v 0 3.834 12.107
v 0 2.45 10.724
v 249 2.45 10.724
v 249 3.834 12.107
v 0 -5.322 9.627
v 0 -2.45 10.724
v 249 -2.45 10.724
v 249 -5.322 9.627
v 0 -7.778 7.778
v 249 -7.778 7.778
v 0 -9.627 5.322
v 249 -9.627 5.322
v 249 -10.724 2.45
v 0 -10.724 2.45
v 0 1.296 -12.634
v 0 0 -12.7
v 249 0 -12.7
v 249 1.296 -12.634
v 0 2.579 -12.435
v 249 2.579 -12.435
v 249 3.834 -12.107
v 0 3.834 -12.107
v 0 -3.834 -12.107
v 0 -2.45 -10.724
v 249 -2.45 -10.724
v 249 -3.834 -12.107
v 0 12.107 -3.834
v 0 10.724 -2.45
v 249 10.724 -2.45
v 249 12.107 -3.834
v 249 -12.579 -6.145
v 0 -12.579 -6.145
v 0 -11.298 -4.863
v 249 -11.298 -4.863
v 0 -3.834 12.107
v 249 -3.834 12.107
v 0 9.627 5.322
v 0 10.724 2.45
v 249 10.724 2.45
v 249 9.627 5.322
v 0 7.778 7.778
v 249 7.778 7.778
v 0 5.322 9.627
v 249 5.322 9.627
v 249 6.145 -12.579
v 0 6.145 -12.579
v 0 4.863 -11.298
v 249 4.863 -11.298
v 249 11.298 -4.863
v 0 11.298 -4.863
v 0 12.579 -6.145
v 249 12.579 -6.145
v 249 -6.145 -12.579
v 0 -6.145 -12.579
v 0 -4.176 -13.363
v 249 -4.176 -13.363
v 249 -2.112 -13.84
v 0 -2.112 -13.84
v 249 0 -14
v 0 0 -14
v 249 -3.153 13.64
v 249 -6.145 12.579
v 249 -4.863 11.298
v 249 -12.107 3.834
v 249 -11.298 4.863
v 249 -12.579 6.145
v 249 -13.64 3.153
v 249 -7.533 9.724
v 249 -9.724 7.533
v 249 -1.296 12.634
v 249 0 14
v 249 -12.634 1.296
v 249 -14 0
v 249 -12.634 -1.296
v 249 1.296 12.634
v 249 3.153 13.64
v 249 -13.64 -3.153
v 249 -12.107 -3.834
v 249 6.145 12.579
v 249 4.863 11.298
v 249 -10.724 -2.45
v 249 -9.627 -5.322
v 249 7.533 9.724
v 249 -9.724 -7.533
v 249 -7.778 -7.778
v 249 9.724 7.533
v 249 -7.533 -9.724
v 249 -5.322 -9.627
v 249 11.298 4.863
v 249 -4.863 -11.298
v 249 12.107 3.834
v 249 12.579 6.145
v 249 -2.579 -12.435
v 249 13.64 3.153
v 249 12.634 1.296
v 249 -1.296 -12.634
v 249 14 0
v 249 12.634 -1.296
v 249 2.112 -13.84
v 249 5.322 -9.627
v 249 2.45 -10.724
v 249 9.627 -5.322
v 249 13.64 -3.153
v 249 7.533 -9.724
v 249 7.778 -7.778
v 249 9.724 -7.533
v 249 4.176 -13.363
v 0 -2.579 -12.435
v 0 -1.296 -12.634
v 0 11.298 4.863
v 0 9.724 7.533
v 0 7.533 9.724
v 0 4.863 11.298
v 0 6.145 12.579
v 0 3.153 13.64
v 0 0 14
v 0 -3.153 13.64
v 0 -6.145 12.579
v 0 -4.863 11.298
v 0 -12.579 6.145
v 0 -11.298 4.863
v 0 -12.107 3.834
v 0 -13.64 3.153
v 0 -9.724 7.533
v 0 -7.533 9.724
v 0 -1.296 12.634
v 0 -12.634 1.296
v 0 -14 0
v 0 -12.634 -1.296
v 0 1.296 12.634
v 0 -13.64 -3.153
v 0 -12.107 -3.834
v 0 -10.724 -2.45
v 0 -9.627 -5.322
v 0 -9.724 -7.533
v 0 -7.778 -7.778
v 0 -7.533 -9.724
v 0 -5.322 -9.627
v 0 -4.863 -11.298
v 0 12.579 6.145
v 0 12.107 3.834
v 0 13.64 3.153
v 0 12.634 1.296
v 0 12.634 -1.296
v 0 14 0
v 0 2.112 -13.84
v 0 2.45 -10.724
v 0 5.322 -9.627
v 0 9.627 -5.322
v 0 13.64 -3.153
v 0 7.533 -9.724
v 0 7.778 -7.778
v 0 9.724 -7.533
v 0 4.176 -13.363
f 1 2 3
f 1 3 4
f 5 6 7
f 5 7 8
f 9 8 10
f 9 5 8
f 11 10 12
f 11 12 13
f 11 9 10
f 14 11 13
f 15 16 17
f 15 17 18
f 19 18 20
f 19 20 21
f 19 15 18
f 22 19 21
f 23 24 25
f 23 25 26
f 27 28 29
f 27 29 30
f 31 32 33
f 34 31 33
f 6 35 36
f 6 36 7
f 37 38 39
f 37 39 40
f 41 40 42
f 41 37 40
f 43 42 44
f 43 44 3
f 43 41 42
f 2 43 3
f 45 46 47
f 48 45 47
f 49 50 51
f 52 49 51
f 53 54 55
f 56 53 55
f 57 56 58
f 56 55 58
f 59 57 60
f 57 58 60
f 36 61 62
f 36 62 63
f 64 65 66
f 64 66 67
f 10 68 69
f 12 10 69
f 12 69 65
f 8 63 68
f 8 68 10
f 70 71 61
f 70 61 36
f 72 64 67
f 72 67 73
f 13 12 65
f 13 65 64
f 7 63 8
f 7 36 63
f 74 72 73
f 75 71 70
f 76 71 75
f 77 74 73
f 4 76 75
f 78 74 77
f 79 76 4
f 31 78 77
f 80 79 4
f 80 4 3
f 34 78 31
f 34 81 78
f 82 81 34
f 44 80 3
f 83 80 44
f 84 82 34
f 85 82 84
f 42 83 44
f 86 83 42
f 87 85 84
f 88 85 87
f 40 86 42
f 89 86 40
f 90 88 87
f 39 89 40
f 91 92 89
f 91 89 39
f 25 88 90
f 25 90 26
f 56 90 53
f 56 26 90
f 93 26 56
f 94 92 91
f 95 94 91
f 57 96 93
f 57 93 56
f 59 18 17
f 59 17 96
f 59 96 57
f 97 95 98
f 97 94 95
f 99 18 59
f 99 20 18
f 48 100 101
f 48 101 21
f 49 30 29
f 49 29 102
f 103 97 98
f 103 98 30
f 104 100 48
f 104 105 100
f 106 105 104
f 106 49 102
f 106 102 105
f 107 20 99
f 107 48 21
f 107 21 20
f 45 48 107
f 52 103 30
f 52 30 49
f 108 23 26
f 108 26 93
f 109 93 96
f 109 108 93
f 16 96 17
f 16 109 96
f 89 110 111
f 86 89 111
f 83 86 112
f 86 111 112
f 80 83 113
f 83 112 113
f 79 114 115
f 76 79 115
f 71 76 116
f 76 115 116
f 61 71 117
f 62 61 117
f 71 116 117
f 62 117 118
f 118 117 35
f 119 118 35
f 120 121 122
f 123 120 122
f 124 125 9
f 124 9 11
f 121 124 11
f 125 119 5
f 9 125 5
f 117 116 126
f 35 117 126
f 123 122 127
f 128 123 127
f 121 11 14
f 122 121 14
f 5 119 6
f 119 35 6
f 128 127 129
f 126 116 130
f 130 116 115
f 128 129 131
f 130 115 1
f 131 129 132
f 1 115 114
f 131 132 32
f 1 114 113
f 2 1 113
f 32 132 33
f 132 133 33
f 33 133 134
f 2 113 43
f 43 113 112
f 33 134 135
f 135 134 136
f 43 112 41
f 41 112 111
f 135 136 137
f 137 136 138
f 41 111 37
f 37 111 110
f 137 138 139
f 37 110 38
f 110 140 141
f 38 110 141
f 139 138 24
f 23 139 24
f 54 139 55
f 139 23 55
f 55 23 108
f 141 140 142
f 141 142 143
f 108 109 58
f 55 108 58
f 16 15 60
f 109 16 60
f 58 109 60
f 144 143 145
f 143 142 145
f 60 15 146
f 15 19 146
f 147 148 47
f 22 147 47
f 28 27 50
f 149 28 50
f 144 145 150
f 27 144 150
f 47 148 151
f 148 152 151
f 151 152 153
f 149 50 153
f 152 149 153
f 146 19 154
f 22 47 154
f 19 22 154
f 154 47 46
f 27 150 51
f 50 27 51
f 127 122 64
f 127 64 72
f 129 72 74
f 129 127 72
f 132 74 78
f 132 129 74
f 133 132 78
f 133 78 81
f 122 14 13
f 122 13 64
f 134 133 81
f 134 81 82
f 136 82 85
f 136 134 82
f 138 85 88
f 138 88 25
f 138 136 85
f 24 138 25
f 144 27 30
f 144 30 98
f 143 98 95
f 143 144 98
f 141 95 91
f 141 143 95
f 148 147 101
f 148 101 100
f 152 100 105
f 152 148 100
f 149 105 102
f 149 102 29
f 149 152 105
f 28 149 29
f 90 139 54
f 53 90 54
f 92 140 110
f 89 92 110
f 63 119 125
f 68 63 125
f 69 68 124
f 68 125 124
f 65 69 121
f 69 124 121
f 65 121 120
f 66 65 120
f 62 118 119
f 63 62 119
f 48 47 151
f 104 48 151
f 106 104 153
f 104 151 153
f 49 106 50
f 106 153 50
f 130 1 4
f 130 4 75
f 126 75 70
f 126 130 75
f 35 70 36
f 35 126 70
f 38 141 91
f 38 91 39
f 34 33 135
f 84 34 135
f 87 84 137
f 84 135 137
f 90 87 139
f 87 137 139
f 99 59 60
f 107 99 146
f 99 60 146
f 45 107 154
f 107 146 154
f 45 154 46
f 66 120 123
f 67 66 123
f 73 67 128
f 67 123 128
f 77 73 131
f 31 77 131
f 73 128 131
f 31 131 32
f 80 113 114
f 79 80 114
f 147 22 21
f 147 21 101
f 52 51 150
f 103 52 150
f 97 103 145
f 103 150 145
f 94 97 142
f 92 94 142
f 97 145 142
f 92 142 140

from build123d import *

# Parameters (mm, degrees)
BOSS_EXTRUDE1_DEPTH = 249


with BuildPart() as part:
    # Sketch1 → Boss-Extrude1 (new body)
    with BuildSketch(Plane(origin=(0, 0, 0), x_dir=(0, 0, -1), z_dir=(1, 0, 0))):
        with BuildLine():
            Line((-11.297790668, 4.86311896), (-12.579426967, 6.144755258))
            ThreePointArc((-12.579426967, 6.144755258), (-14, 0), (-12.579426967, -6.144755258))
            Line((-12.579426967, -6.144755258), (-11.297790668, -4.86311896))
            ThreePointArc((-11.297790668, -4.86311896), (-8.697413409, -8.697413409), (-4.86311896, -11.297790668))
            Line((-4.86311896, -11.297790668), (-6.144755258, -12.579426967))
            ThreePointArc((-6.144755258, -12.579426967), (0, -14), (6.144755258, -12.579426967))
            Line((6.144755258, -12.579426967), (4.86311896, -11.297790668))
            ThreePointArc((4.86311896, -11.297790668), (8.697413409, -8.697413409), (11.297790668, -4.86311896))
            Line((11.297790668, -4.86311896), (12.579426967, -6.144755258))
            ThreePointArc((12.579426967, -6.144755258), (13.64023419, -3.153412633), (14, 0))
            ThreePointArc((14, 0), (13.64023419, 3.153412633), (12.579426967, 6.144755258))
            Line((12.579426967, 6.144755258), (11.297790668, 4.86311896))
            ThreePointArc((11.297790668, 4.86311896), (8.697413409, 8.697413409), (4.86311896, 11.297790668))
            Line((4.86311896, 11.297790668), (6.144755258, 12.579426967))
            ThreePointArc((6.144755258, 12.579426967), (0, 14), (-6.144755258, 12.579426967))
            Line((-6.144755258, 12.579426967), (-4.86311896, 11.297790668))
            ThreePointArc((-4.86311896, 11.297790668), (-8.697413409, 8.697413409), (-11.297790668, 4.86311896))
        make_face()
        with BuildLine():
            Line((-10.723588409, 2.450439069), (-12.107380777, 3.834231437))
            ThreePointArc((-12.107380777, 3.834231437), (-12.7, 0), (-12.107380777, -3.834231437))
            Line((-12.107380777, -3.834231437), (-10.723588409, -2.450439069))
            ThreePointArc((-10.723588409, -2.450439069), (-7.778174593, -7.778174593), (-2.450439069, -10.723588409))
            Line((-2.450439069, -10.723588409), (-3.834231437, -12.107380777))
            ThreePointArc((-3.834231437, -12.107380777), (0, -12.7), (3.834231437, -12.107380777))
            Line((3.834231437, -12.107380777), (2.450439069, -10.723588409))
            ThreePointArc((2.450439069, -10.723588409), (7.778174593, -7.778174593), (10.723588409, -2.450439069))
            Line((10.723588409, -2.450439069), (12.107380777, -3.834231437))
            ThreePointArc((12.107380777, -3.834231437), (12.550970797, -1.939879394), (12.7, 0))
            ThreePointArc((12.7, 0), (12.550970797, 1.939879394), (12.107380777, 3.834231437))
            Line((12.107380777, 3.834231437), (10.723588409, 2.450439069))
            ThreePointArc((10.723588409, 2.450439069), (7.778174593, 7.778174593), (2.450439069, 10.723588409))
            Line((2.450439069, 10.723588409), (3.834231437, 12.107380777))
            ThreePointArc((3.834231437, 12.107380777), (0, 12.7), (-3.834231437, 12.107380777))
            Line((-3.834231437, 12.107380777), (-2.450439069, 10.723588409))
            ThreePointArc((-2.450439069, 10.723588409), (-7.778174593, 7.778174593), (-10.723588409, 2.450439069))
        make_face(mode=Mode.SUBTRACT)
    extrude(amount=BOSS_EXTRUDE1_DEPTH)


solid = part.part
